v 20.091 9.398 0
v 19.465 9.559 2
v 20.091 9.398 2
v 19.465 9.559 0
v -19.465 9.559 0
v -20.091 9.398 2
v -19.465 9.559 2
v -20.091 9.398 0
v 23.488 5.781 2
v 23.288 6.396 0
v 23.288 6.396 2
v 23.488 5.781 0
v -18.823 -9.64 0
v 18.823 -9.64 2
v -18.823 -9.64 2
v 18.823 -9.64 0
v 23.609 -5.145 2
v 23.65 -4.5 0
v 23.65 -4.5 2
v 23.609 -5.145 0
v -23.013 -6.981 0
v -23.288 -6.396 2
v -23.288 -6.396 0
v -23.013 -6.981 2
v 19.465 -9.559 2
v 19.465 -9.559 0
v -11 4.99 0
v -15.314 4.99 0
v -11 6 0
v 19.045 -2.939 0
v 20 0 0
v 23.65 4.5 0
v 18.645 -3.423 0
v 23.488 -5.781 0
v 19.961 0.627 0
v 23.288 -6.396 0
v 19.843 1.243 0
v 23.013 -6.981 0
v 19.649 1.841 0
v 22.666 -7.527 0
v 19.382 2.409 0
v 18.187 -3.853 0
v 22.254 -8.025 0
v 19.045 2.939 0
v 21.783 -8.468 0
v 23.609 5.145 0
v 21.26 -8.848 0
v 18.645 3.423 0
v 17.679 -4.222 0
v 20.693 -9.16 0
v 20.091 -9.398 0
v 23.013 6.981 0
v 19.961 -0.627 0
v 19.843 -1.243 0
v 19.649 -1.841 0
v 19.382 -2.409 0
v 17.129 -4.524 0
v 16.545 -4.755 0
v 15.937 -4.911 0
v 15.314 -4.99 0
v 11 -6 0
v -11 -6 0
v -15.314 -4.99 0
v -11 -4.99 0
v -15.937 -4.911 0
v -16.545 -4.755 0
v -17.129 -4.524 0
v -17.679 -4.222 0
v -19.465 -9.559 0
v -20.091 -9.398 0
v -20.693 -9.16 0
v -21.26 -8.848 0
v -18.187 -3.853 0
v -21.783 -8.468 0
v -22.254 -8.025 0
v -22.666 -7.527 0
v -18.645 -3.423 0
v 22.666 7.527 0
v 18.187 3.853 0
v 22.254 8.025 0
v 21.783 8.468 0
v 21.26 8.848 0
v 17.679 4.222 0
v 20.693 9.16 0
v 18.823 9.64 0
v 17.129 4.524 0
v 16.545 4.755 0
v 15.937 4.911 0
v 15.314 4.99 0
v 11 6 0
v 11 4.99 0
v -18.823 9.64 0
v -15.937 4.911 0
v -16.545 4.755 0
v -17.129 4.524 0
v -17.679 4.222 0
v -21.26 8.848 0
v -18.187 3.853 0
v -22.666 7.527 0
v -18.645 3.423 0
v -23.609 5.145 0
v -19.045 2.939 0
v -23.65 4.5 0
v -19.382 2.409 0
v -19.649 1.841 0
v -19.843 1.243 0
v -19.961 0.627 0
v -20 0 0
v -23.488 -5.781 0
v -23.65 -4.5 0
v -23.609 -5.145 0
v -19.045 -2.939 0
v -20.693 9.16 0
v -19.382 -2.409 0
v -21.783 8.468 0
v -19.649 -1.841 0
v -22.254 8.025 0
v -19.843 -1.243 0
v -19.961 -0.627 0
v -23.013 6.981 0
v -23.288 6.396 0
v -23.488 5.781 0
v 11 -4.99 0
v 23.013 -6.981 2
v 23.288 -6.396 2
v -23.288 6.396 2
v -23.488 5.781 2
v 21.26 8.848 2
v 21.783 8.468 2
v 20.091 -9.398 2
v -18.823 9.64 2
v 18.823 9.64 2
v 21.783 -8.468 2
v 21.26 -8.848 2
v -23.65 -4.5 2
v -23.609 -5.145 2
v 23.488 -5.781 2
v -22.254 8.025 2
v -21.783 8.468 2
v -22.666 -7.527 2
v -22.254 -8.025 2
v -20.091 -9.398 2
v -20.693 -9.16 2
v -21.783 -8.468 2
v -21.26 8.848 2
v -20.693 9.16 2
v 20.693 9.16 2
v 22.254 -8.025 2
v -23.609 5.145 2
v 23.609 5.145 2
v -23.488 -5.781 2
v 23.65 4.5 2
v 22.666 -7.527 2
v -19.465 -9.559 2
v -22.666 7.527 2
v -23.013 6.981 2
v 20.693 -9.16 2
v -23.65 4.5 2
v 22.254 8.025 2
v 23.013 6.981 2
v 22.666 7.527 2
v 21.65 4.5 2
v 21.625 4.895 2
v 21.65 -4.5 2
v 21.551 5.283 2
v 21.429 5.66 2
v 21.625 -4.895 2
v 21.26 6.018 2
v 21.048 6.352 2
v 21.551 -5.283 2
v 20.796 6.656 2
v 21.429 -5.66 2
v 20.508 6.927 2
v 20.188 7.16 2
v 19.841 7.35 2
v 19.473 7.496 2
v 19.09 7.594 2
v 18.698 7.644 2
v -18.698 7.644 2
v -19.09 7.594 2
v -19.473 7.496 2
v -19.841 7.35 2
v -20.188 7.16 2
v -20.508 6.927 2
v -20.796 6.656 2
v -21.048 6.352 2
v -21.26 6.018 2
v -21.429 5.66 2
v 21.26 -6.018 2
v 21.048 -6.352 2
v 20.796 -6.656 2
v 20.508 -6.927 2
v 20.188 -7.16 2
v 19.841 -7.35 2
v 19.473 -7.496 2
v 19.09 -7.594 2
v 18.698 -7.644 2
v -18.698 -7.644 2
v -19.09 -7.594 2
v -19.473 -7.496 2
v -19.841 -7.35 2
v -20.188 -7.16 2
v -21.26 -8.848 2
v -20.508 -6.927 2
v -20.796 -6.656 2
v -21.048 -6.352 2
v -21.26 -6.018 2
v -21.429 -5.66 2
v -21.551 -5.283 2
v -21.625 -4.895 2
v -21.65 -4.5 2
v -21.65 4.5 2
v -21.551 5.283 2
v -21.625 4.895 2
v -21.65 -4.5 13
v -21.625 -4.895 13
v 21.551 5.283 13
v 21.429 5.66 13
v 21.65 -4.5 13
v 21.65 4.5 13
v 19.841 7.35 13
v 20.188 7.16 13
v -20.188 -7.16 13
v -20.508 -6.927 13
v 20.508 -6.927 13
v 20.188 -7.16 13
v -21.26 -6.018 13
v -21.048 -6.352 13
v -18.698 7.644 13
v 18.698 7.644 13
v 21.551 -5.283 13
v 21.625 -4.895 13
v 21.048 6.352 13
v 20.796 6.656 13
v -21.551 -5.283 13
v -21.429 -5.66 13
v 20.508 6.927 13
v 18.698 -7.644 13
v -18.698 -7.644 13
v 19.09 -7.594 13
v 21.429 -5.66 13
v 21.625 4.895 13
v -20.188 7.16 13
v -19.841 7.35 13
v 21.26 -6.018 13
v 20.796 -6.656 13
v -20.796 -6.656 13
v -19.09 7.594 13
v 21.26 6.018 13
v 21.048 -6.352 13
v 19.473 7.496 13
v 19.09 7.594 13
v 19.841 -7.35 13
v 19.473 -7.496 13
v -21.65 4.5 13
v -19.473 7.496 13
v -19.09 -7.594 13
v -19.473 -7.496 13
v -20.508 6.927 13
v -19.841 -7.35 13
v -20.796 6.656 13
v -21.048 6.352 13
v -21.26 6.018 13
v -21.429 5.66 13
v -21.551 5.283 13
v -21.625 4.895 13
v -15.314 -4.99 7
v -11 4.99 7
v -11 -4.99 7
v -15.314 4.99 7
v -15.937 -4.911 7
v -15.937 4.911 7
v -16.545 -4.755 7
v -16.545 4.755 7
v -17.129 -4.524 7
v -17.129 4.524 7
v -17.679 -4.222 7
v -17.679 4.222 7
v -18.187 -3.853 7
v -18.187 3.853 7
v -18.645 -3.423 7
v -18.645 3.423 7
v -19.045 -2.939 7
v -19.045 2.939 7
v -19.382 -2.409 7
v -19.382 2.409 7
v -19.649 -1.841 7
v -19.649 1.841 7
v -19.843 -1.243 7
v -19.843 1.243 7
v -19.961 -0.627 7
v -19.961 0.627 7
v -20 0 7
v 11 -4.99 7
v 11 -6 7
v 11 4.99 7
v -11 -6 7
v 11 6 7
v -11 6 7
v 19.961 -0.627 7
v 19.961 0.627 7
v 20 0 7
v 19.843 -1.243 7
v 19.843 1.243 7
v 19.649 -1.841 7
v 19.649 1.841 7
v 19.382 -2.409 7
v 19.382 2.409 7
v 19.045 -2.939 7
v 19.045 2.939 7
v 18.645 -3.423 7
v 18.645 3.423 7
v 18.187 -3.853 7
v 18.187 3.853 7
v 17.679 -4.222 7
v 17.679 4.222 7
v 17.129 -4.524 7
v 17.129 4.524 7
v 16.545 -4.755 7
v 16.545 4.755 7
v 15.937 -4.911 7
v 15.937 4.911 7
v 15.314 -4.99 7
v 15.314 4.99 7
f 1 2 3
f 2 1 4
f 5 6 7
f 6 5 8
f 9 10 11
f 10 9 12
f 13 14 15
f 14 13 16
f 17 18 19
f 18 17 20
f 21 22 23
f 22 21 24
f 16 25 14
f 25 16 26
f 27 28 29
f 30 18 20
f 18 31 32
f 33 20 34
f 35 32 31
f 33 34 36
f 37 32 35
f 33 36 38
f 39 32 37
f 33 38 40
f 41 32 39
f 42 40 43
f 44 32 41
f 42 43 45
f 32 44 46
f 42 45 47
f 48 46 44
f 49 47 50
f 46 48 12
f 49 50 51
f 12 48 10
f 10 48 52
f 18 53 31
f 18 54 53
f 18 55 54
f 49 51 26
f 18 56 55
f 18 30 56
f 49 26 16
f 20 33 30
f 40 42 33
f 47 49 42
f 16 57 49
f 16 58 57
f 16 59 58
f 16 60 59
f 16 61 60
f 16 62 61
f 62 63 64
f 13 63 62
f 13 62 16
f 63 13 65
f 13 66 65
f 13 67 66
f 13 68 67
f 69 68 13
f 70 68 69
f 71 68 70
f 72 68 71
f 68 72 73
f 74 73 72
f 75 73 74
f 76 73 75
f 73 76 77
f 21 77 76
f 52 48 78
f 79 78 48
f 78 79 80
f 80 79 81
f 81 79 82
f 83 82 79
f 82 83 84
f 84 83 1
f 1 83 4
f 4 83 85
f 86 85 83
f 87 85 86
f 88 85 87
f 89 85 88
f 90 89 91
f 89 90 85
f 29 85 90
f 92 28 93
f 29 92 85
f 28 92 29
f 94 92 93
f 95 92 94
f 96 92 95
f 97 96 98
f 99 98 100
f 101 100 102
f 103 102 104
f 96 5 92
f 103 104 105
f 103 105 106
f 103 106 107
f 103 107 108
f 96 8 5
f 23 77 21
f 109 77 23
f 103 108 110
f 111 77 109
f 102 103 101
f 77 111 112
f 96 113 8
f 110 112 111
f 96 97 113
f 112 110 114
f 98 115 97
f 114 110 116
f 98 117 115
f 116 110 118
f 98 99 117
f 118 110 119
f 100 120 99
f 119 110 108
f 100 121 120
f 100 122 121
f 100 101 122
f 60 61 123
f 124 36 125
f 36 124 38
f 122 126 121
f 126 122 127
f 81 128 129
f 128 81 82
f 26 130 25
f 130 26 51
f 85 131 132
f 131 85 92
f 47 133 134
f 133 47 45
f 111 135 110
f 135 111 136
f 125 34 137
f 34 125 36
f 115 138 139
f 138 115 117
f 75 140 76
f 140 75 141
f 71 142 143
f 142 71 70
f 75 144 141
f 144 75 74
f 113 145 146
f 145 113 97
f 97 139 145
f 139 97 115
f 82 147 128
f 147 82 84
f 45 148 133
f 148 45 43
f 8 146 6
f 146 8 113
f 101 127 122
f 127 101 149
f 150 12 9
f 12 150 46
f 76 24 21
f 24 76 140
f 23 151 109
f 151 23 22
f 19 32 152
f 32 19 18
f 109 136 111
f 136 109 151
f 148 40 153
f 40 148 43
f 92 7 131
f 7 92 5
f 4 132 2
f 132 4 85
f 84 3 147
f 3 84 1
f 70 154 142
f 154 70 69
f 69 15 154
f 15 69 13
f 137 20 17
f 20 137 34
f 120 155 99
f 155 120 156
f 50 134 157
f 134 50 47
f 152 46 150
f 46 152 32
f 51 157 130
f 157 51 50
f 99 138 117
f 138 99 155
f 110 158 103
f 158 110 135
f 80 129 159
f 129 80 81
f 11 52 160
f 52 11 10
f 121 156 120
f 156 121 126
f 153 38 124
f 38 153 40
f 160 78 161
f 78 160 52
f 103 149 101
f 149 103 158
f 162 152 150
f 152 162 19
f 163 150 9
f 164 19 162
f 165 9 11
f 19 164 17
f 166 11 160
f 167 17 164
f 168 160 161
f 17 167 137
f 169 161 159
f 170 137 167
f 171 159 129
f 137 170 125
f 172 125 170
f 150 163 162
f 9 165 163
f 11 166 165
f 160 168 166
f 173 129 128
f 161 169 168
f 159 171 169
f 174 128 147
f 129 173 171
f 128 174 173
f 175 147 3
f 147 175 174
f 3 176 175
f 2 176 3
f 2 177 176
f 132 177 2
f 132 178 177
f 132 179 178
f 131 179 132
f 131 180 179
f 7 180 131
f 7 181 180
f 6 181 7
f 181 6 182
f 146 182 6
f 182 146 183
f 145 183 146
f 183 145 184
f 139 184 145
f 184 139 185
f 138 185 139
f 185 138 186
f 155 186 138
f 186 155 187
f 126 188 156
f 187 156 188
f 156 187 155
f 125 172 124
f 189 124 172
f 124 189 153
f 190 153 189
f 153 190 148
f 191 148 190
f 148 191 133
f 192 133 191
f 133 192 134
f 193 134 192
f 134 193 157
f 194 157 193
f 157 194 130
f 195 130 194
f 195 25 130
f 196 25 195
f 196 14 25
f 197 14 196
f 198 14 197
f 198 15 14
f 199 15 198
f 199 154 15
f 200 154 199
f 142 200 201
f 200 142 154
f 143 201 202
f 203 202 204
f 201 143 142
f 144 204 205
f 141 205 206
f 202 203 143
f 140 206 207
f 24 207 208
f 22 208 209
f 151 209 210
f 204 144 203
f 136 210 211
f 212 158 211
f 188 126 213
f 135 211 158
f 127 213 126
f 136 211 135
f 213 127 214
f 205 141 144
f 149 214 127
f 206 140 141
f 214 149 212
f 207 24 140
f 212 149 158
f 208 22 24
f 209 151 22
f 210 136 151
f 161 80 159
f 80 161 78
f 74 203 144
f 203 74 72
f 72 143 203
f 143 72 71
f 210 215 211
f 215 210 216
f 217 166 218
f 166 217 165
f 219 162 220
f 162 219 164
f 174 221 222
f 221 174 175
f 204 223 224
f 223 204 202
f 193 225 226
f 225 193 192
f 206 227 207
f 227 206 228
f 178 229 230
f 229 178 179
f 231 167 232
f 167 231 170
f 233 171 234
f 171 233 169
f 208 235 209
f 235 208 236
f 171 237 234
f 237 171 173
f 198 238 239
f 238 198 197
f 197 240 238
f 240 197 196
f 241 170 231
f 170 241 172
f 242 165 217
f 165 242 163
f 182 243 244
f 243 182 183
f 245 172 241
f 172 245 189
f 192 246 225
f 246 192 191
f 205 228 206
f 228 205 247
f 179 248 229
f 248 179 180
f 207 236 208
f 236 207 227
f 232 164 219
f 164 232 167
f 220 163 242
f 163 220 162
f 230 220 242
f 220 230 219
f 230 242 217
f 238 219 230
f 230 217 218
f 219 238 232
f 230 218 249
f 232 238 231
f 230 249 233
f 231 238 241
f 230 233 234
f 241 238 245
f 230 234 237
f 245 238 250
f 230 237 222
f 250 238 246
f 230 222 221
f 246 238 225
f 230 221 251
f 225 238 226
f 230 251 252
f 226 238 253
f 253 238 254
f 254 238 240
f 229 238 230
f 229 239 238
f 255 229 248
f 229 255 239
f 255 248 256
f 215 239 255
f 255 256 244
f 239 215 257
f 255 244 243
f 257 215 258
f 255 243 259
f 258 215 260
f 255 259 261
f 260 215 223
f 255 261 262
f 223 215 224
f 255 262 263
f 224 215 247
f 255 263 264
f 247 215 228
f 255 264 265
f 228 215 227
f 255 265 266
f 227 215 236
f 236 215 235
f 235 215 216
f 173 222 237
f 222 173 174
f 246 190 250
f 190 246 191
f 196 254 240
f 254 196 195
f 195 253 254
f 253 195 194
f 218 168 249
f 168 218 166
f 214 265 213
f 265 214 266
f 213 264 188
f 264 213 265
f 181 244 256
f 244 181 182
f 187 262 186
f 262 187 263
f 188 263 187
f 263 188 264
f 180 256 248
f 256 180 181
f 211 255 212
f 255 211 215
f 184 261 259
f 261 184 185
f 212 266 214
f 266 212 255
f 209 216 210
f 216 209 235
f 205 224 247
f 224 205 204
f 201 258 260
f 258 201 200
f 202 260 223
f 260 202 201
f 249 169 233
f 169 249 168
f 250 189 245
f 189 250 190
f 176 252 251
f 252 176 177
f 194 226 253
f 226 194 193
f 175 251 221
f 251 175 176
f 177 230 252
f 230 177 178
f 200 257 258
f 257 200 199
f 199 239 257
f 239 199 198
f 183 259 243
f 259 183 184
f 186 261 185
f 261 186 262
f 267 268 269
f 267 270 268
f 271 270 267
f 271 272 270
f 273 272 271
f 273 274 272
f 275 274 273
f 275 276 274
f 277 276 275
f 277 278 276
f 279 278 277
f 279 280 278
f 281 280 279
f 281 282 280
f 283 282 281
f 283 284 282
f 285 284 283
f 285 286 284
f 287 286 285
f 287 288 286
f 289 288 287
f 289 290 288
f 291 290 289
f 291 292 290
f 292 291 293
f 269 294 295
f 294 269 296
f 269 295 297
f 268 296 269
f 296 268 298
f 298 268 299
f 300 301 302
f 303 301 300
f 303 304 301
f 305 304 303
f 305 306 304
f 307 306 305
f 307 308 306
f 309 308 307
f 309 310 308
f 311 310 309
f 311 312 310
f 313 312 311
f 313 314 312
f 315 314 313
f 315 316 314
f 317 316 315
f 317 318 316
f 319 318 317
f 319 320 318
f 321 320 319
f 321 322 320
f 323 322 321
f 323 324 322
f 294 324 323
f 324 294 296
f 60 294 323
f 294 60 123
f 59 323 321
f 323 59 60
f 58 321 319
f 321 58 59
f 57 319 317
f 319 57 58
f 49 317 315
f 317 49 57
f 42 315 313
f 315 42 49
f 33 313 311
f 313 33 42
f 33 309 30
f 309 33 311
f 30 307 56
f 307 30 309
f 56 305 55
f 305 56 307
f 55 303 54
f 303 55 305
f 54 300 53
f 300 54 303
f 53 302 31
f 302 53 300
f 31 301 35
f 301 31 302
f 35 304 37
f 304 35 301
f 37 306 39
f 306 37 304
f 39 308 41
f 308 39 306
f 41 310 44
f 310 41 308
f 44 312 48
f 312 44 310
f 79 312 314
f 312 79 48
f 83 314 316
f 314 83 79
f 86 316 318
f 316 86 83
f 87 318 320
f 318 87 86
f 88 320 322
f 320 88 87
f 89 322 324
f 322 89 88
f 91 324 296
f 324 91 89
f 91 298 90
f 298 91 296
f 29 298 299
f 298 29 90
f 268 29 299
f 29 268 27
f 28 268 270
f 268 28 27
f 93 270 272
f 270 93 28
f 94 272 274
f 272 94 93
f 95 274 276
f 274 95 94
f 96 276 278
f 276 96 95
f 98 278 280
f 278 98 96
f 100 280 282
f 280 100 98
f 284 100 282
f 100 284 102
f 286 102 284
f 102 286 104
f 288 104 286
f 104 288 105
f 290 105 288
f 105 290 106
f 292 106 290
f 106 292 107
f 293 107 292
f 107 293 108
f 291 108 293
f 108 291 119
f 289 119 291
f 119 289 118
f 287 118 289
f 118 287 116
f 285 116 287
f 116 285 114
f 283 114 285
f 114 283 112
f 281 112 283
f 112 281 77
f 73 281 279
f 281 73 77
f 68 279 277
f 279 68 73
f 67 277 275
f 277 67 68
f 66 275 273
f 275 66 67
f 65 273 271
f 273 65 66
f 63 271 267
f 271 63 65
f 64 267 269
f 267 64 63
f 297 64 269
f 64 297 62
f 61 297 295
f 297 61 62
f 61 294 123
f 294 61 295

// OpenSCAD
$fn = 50;

thickness = 2;
circle_d = 6.3;
size = [39.3+2*thickness-circle_d, 11.3+2*thickness-circle_d];
height=11;

difference() {
    union() {
        linear_extrude(height=2)
        body(size, circle_d+4);
        translate([0, 0, 2]) 
        linear_extrude(height=height)
        body(size, circle_d);
    };
    linear_extrude(height=height+1-5) {
        hull() {
            translate([-30/2, 0])
            circle(d=10);
            translate([30/2, 0])
            circle(d=10);
        };
        
        square([22, 12], center=true);
    }
};

module body(size, circle_d) {
    minkowski() {
        circle(d=circle_d);
        square([size.x, size.y], center=true);
    }
}
